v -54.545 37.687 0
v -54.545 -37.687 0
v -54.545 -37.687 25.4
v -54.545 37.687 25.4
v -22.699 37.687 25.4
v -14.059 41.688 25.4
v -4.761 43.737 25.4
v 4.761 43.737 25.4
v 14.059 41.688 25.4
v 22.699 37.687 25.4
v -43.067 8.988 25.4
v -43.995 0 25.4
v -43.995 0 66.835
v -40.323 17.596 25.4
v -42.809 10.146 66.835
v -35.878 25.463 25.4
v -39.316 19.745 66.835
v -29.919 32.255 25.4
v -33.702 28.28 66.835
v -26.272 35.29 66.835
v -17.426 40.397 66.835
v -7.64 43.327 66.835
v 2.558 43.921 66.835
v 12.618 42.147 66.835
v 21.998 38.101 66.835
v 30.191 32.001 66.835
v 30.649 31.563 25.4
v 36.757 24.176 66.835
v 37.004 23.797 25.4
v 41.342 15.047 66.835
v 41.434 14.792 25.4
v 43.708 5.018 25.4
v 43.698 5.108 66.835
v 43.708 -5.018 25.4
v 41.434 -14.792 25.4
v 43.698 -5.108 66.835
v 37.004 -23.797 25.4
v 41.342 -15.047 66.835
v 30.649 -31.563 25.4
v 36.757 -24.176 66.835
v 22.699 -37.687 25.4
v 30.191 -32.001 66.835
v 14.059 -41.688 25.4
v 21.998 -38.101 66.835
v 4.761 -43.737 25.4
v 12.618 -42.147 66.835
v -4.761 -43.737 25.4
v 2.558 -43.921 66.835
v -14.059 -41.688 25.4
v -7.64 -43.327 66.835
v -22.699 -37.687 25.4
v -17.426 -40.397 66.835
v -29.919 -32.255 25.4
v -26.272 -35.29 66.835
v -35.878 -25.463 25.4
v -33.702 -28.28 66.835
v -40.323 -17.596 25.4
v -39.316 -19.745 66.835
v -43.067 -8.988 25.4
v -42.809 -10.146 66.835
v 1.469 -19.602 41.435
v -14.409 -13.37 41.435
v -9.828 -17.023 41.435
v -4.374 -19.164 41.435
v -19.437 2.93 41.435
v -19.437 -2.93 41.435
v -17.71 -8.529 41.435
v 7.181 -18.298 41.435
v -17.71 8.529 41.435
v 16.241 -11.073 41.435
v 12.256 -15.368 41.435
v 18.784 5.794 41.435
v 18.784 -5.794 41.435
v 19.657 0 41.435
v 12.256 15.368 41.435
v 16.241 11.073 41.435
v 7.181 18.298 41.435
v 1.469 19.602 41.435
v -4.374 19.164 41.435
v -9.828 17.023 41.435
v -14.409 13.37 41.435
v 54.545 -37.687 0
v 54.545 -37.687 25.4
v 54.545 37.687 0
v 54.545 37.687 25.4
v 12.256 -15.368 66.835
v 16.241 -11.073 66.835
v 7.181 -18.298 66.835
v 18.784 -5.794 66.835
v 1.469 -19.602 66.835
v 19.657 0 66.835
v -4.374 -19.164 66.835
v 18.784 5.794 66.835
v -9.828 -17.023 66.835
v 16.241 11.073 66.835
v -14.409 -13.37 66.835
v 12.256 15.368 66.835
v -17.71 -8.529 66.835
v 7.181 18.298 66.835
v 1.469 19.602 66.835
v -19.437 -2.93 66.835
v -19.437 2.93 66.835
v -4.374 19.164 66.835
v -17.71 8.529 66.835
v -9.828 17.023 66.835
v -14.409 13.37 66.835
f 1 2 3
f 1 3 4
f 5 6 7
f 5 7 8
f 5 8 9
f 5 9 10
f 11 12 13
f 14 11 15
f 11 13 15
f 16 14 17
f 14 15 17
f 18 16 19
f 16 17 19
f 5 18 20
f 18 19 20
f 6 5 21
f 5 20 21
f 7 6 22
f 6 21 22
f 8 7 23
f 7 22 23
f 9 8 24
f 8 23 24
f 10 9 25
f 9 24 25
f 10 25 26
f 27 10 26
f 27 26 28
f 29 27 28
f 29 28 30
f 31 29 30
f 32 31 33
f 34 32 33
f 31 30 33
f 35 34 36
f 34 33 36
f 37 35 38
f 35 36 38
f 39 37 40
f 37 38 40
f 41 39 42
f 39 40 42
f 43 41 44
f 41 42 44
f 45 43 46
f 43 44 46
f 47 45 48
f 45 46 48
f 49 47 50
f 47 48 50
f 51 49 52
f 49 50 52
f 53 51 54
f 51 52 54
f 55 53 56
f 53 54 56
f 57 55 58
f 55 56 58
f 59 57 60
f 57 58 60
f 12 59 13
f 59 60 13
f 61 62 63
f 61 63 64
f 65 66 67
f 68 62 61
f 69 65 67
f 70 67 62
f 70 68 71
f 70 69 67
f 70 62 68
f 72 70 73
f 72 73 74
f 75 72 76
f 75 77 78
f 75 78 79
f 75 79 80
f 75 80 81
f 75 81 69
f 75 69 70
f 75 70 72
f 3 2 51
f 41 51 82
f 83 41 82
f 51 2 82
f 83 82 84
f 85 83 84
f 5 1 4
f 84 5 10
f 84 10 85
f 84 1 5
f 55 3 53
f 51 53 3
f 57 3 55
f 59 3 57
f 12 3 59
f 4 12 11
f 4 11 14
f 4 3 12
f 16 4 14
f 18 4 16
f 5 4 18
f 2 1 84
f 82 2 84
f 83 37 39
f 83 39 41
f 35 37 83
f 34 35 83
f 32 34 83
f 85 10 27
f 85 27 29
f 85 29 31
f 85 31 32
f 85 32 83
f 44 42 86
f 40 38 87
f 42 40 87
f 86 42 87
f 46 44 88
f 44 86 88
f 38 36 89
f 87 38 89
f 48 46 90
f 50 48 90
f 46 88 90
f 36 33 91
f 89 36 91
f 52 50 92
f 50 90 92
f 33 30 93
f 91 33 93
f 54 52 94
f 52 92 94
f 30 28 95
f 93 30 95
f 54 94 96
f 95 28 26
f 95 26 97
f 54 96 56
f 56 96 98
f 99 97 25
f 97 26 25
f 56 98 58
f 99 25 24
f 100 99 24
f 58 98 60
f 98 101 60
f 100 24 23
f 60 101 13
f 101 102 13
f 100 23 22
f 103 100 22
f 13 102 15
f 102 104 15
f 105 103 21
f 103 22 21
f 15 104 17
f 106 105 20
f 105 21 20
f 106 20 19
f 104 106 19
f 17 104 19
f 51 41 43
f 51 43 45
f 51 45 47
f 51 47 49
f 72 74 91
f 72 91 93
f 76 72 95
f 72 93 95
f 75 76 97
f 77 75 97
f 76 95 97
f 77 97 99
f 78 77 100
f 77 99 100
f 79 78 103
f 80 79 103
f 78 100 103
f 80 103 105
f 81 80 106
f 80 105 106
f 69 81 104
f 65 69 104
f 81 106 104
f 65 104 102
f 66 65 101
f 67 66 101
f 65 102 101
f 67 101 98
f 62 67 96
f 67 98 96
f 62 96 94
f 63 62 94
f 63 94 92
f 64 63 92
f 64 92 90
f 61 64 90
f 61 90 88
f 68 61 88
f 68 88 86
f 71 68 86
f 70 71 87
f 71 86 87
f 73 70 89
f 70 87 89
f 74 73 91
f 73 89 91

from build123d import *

# Parameters (mm, degrees)
F0_W     = 109.0900748968
F0_H     = 75.3747150302
F1_DEPTH = 25.4
F2_W     = 43.9951886518
F2_H     = 41.4347245544
F4_R     = 19.656837966
F5_DEPTH = 25.4


with BuildPart() as f1:
    # F0 (on Top) → F1 (new body)
    with BuildSketch(Plane.XY):
        Rectangle(F0_W, F0_H)
    extrude(amount=F1_DEPTH)

    # F2 (on Front) → F3 (revolve)
    with BuildSketch(Plane.XZ):
        with Locations((-21.9975943259, 46.1173622772)):
            Rectangle(F2_W, F2_H)
    revolve(axis=Axis((0, 0, 46.1173622772), (0, 0, -1)))

    # F4 (on face) → F5 (cut)
    with BuildSketch(Plane.XY.offset(66.8347245544)):
        Circle(F4_R)
    extrude(amount=-F5_DEPTH, mode=Mode.SUBTRACT)


solid = f1.part
